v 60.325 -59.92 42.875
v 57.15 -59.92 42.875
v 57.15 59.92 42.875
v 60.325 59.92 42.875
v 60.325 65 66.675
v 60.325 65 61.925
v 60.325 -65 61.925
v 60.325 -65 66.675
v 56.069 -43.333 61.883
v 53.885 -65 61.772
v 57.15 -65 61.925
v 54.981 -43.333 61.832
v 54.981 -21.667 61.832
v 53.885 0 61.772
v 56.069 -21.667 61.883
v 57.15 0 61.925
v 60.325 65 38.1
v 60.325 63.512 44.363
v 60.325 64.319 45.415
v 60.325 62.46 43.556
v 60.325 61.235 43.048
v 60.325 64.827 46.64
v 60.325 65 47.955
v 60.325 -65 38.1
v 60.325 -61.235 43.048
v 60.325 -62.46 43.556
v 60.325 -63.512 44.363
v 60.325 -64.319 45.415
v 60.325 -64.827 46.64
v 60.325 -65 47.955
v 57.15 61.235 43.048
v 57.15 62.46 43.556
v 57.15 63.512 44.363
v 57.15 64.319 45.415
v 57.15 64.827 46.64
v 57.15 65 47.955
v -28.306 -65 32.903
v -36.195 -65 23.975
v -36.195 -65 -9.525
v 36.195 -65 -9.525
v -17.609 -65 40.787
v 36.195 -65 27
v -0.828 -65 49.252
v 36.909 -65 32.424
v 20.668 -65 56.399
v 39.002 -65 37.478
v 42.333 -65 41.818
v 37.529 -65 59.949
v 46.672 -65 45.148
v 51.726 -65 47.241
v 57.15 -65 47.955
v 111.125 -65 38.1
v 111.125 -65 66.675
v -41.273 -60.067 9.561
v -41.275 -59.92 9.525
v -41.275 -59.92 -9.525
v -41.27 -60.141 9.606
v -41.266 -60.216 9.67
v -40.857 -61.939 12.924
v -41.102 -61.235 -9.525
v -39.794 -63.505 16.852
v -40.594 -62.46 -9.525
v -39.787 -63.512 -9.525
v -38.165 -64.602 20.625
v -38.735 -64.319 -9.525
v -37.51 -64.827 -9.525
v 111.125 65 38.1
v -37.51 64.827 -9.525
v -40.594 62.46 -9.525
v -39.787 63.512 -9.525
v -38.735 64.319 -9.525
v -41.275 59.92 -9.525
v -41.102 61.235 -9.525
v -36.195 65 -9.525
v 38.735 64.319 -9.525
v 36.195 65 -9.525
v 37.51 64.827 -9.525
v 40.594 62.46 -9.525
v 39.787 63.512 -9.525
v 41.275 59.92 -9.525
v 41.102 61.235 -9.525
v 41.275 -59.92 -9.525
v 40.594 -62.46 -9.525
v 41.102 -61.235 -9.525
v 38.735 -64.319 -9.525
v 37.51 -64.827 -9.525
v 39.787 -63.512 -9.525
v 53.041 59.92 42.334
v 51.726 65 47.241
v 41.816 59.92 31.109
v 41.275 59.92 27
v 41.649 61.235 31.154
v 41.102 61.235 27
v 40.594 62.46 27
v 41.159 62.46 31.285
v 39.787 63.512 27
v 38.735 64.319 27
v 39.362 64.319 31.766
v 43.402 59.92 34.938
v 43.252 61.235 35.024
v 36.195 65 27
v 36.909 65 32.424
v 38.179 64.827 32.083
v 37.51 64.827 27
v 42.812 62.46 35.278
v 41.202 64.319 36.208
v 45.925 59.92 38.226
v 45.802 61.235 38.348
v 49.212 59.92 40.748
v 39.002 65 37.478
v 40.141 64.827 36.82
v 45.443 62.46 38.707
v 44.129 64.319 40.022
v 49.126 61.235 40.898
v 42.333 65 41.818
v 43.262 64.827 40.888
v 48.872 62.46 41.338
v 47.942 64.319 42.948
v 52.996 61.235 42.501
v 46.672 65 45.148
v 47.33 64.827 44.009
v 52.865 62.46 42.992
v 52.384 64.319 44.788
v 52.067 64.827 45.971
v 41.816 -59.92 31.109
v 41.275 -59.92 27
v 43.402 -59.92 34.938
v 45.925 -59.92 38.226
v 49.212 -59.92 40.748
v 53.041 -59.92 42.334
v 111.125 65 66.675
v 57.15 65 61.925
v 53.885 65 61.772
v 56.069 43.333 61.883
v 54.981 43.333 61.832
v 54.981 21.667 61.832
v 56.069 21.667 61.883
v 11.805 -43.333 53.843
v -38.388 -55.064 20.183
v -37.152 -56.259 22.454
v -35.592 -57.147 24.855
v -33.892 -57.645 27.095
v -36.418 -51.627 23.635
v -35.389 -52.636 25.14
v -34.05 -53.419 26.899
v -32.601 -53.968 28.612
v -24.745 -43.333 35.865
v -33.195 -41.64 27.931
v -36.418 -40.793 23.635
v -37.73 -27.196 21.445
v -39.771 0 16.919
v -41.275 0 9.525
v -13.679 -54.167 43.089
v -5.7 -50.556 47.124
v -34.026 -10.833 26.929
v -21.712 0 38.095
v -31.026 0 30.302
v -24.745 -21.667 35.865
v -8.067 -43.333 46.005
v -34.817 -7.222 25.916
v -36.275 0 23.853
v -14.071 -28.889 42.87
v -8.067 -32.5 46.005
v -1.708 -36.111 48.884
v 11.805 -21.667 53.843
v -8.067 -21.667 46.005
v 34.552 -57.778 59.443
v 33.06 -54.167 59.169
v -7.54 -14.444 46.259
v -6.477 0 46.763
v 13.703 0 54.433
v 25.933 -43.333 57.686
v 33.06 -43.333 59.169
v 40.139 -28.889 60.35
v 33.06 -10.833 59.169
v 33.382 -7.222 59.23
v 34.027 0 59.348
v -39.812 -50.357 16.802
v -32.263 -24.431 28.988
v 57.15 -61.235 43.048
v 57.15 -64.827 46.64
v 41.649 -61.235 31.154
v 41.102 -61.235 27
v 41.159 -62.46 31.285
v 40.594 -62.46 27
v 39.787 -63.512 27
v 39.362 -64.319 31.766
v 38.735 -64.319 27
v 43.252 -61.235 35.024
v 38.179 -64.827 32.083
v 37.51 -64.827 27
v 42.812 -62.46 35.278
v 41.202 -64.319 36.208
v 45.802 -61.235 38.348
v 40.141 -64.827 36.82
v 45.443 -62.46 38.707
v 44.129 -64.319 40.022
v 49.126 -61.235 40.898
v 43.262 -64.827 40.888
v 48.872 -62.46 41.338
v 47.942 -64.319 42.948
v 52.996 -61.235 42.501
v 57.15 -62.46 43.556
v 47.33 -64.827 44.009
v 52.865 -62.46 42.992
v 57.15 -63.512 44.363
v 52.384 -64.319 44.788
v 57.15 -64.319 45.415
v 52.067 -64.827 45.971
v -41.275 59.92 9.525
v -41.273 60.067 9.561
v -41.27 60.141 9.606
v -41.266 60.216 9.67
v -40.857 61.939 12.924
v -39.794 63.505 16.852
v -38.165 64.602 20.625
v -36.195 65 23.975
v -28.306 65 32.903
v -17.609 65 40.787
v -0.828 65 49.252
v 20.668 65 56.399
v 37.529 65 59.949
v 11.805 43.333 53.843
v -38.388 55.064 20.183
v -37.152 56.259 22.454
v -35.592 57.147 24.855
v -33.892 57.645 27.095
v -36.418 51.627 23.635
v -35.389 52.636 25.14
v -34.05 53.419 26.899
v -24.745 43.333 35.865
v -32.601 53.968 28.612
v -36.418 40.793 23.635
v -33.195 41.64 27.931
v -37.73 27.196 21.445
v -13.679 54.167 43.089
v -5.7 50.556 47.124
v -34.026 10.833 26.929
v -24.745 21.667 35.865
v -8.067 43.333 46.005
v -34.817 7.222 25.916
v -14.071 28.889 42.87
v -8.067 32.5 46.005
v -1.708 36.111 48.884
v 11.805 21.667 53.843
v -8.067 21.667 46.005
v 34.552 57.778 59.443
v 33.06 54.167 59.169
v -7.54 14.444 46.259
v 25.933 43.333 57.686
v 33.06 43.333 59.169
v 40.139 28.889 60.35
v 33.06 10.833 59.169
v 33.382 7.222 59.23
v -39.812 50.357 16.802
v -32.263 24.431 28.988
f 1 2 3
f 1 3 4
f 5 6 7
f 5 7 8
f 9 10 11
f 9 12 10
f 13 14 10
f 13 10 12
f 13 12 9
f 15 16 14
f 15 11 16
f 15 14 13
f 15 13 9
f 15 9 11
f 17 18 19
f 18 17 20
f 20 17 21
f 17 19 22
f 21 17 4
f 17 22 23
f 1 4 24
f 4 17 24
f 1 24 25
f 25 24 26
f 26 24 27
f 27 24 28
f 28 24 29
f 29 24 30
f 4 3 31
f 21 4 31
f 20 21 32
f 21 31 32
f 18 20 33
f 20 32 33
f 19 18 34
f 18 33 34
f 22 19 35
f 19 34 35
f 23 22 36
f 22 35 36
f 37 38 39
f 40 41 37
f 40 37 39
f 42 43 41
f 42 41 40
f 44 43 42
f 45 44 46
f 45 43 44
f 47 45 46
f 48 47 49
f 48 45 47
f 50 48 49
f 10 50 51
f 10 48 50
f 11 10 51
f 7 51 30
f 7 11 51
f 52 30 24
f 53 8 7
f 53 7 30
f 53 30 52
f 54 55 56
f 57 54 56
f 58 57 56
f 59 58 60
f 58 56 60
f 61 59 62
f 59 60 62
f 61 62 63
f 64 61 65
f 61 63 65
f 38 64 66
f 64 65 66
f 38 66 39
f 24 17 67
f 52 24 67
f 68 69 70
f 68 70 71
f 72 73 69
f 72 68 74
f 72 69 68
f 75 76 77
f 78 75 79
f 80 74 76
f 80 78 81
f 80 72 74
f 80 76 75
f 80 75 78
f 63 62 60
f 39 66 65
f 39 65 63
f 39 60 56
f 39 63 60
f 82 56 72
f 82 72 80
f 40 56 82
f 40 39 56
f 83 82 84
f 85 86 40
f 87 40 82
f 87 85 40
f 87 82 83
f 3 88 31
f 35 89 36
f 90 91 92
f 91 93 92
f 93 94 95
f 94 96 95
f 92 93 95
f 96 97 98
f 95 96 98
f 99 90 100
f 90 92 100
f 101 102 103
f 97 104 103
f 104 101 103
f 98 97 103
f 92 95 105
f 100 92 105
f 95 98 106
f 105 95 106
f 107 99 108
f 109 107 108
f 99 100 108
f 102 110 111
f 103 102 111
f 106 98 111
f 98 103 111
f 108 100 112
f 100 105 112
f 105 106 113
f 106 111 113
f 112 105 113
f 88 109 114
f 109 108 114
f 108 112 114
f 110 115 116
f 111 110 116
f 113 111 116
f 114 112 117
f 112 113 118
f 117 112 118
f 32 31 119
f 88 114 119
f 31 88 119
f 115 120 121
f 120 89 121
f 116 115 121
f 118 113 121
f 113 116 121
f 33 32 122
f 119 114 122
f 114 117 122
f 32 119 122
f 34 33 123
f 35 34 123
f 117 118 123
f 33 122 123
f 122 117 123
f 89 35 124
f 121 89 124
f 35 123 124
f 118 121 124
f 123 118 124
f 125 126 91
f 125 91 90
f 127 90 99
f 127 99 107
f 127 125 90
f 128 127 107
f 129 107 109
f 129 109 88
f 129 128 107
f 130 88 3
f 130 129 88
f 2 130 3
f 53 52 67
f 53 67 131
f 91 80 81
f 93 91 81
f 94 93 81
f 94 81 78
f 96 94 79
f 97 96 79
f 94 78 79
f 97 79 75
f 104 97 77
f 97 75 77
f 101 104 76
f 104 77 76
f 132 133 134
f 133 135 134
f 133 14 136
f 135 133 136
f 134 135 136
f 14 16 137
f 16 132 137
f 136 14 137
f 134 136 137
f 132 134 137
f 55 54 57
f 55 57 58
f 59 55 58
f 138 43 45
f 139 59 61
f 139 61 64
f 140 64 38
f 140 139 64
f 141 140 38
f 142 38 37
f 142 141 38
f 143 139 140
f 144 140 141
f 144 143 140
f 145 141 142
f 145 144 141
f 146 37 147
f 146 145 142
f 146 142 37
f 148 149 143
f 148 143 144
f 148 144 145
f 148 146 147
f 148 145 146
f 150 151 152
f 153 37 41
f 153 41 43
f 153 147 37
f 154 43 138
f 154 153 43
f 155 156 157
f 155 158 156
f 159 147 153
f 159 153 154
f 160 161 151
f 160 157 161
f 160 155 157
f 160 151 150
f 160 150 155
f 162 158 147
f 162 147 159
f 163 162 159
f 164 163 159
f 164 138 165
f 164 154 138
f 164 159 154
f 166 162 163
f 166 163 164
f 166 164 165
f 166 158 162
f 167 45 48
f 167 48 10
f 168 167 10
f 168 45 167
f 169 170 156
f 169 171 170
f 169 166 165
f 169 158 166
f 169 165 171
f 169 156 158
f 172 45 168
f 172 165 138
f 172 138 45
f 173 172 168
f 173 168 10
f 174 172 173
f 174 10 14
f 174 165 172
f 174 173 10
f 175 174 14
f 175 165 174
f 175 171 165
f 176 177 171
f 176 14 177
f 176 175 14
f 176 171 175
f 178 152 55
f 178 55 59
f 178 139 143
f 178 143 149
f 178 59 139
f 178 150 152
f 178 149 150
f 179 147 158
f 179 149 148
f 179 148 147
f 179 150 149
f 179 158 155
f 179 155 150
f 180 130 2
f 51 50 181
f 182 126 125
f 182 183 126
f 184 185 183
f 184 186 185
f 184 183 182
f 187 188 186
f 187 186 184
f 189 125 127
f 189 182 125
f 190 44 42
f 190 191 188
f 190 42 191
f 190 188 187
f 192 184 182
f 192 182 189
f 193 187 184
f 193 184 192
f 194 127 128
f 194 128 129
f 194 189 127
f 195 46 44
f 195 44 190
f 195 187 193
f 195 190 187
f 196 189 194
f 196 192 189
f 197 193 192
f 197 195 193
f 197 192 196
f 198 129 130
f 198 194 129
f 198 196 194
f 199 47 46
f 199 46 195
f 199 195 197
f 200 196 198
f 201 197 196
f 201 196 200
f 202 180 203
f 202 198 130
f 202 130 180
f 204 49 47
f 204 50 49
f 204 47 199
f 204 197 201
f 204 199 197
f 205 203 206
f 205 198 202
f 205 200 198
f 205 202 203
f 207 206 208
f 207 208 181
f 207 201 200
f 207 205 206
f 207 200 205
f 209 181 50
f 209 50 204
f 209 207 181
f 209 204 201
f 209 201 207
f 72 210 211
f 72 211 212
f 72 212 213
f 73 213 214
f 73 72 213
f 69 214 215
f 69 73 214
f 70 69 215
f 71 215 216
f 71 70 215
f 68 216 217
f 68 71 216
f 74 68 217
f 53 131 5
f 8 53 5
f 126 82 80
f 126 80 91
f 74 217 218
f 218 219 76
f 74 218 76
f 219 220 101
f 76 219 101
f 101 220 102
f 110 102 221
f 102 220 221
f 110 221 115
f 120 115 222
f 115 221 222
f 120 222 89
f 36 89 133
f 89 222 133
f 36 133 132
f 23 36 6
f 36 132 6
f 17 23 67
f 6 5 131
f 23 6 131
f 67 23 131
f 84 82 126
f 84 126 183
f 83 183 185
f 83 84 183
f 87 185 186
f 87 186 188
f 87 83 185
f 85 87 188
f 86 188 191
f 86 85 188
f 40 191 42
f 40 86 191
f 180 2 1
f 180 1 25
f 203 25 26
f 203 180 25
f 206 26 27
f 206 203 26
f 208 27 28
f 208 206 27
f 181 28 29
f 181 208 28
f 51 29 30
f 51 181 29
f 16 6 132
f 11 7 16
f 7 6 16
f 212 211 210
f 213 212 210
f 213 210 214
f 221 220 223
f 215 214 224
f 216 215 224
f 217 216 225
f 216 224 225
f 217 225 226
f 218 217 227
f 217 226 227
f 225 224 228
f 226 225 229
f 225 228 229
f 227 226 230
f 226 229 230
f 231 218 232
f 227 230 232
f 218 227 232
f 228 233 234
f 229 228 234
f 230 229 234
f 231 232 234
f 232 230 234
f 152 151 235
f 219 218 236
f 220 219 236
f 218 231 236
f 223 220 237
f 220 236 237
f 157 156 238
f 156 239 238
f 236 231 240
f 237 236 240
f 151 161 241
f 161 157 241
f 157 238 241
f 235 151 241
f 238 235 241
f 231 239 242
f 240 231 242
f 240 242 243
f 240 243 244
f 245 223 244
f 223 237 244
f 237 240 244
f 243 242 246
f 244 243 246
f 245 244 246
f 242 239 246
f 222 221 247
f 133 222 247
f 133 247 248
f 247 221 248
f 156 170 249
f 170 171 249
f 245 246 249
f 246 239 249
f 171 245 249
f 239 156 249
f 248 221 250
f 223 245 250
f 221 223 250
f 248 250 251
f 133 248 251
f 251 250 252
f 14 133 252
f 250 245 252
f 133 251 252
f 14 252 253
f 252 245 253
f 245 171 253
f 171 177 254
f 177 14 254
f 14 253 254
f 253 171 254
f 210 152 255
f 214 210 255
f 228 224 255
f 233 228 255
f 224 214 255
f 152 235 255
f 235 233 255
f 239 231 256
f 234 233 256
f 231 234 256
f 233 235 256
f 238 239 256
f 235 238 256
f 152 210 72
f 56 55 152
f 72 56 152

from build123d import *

# Parameters (mm, degrees)
F0_W         = 25.4
F0_H         = 19.05
F0_H_2       = 4.7498
F0_H_3       = 4.7752
F1_DEPTH     = 65
F2_DEPTH     = 25.4
F3_DEPTH     = 7.9375
F5_T1_DEPTH  = 49.2252
F5_T3_DEPTH  = 53.34
F5_T5_DEPTH  = 3.175
F5_T8_ANGLE  = 90
F5_T10_ANGLE = 90


# Not quite as in the source:
# - a fillet or chamfer that OpenCascade refuses, or shapes differently, is made with other operations: its cross-section is extruded or revolved along the edge and cut away or added


with BuildPart() as f1:
    # F0 (on Front) → F1 (new body, symmetric)
    with BuildSketch(Plane.XZ):
        Polygon((22.225, 9.525), (-41.275, 9.525), (-41.275, -9.525), (41.275, -9.525), (41.275, 9.525), align=None)
        with BuildLine():
            add(Edge.make_bspline(
                [(-41.275, 9.525), (-39.5856284224, 39.4828766469), (13.870125209, 59.4306981306), (53.8854342407, 61.7722898912)],
                knots=[0, 0, 0, 0, 108.5245810491, 108.5245810491, 108.5245810491, 108.5245810491], degree=3))
            Line((-41.275, 9.525), (22.225, 9.525))
            Line((22.225, 9.525), (22.225, 27.0002))
            ThreePointArc((22.225, 27.0002), (31.3258777096, 50.5133948686), (53.8854342407, 61.7722898912))
        make_face()
        with BuildLine():
            Line((22.225, 27.0002), (22.225, 9.525))
            Line((22.225, 9.525), (41.275, 9.525))
            Line((41.275, 9.525), (41.275, 27.0002))
            ThreePointArc((41.275, 27.0002), (45.9246798487, 38.2255201513), (57.15, 42.8752))
            Line((57.15, 42.8752), (60.325, 42.8752))
            Line((60.325, 42.8752), (60.325, 61.9252))
            Line((60.325, 61.9252), (57.15, 61.9252))
            add(Edge.make_bspline(
                [(53.8854342407, 61.7722898912), (54.9842067368, 61.8365871986), (56.0728453275, 61.8876096574), (57.15, 61.9252)],
                knots=[108.5245810491, 108.5245810491, 108.5245810491, 108.5245810491, 111.5045361635, 111.5045361635, 111.5045361635, 111.5045361635], degree=3))
            ThreePointArc((53.8854342407, 61.7722898912), (31.3258777096, 50.5133948686), (22.225, 27.0002))
        make_face()
        with Locations((73.025, 52.4002)):
            Rectangle(F0_W, F0_H)
        with Locations((73.025, 64.3001)):
            Rectangle(F0_W, F0_H_2)
        with Locations((73.025, 40.4876)):
            Rectangle(F0_W, F0_H_3)
        Polygon((85.725, 66.675), (85.725, 61.9252), (85.725, 42.8752), (85.725, 38.1), (111.125, 38.1), (111.125, 66.675), align=None)
    extrude(amount=F1_DEPTH, both=True)

    # F0 (on Front) → F2 (join, symmetric)
    with BuildSketch(Plane.XZ):
        with BuildLine():
            Line((22.225, 27.0002), (22.225, 9.525))
            Line((22.225, 9.525), (41.275, 9.525))
            Line((41.275, 9.525), (41.275, 27.0002))
            ThreePointArc((41.275, 27.0002), (45.9246798487, 38.2255201513), (57.15, 42.8752))
            Line((57.15, 42.8752), (60.325, 42.8752))
            Line((60.325, 42.8752), (60.325, 61.9252))
            Line((60.325, 61.9252), (57.15, 61.9252))
            add(Edge.make_bspline(
                [(53.8854342407, 61.7722898912), (54.9842067368, 61.8365871986), (56.0728453275, 61.8876096574), (57.15, 61.9252)],
                knots=[108.5245810491, 108.5245810491, 108.5245810491, 108.5245810491, 111.5045361635, 111.5045361635, 111.5045361635, 111.5045361635], degree=3))
            ThreePointArc((53.8854342407, 61.7722898912), (31.3258777096, 50.5133948686), (22.225, 27.0002))
        make_face()
        with Locations((73.025, 52.4002)):
            Rectangle(F0_W, F0_H)
    extrude(amount=F2_DEPTH, both=True)

    # F0 (on Front) → F3 (join, symmetric)
    with BuildSketch(Plane.XZ):
        with BuildLine():
            add(Edge.make_bspline(
                [(-41.275, 9.525), (-39.5856284224, 39.4828766469), (13.870125209, 59.4306981306), (53.8854342407, 61.7722898912)],
                knots=[0, 0, 0, 0, 108.5245810491, 108.5245810491, 108.5245810491, 108.5245810491], degree=3))
            Line((-41.275, 9.525), (22.225, 9.525))
            Line((22.225, 9.525), (22.225, 27.0002))
            ThreePointArc((22.225, 27.0002), (31.3258777096, 50.5133948686), (53.8854342407, 61.7722898912))
        make_face()
    extrude(amount=F3_DEPTH, both=True)

    # F0 (on Front) → F4 (revolve)
    with BuildSketch(Plane.XZ):
        Polygon((85.725, 66.675), (85.725, 61.9252), (85.725, 42.8752), (85.725, 38.1), (111.125, 38.1), (111.125, 66.675), align=None)
    revolve(axis=Axis((85.725, 0, 52.3875), (0, 0, 1)))

    # F5: fillet of radius 5.08 on 8 edges, made by hand

    # F5_s2 → F5_t1 (cut)
    with BuildSketch(Plane.XY.offset(-22.225)):
        with BuildLine():
            ThreePointArc((41.275, -59.92), (39.7871024484, -63.5121024484), (36.195, -65))
            Line((36.195, -65), (41.275, -65))
            Line((41.275, -65), (41.275, -59.92))
        make_face()
        with BuildLine():
            ThreePointArc((41.275, 59.92), (39.7871024484, 63.5121024484), (36.195, 65))
            Line((36.195, 65), (41.275, 65))
            Line((41.275, 65), (41.275, 59.92))
        make_face()
    extrude(amount=F5_T1_DEPTH, mode=Mode.SUBTRACT)

    # F5_s4 → F5_t3 (cut)
    with BuildSketch(Plane.XY.offset(-22.225)):
        with BuildLine():
            ThreePointArc((-41.275, -59.92), (-39.7871024484, -63.5121024484), (-36.195, -65))
            Line((-36.195, -65), (-41.275, -65))
            Line((-41.275, -65), (-41.275, -59.92))
        make_face()
        with BuildLine():
            ThreePointArc((-41.275, 59.92), (-39.7871024484, 63.5121024484), (-36.195, 65))
            Line((-36.195, 65), (-41.275, 65))
            Line((-41.275, 65), (-41.275, 59.92))
        make_face()
    extrude(amount=F5_T3_DEPTH, mode=Mode.SUBTRACT)

    # F5_s6 → F5_t5 (cut)
    with BuildSketch(Plane.YZ.offset(57.15)):
        with BuildLine():
            ThreePointArc((59.92, 42.8752), (63.5121024484, 44.3630975516), (65, 47.9552))
            Line((65, 47.9552), (65, 42.8752))
            Line((65, 42.8752), (59.92, 42.8752))
        make_face()
        with BuildLine():
            ThreePointArc((-59.92, 42.8752), (-63.5121024484, 44.3630975516), (-65, 47.9552))
            Line((-65, 47.9552), (-65, 42.8752))
            Line((-65, 42.8752), (-59.92, 42.8752))
        make_face()
    extrude(amount=F5_T5_DEPTH, mode=Mode.SUBTRACT)

    # F5_s7 → F5_t8 (revolve, cut)
    with BuildSketch(Plane.XY.offset(27.0002)):
        with BuildLine():
            ThreePointArc((41.275, 59.92), (39.7871024484, 63.5121024484), (36.195, 65))
            Line((36.195, 65), (41.275, 65))
            Line((41.275, 65), (41.275, 59.92))
        make_face()
    revolve(axis=Axis((57.15, 65, 27.0002), (0, 1, 0)), revolution_arc=F5_T8_ANGLE, mode=Mode.SUBTRACT)

    # F5_s9 → F5_t10 (revolve, cut)
    with BuildSketch(Plane.XY.offset(27.0002)):
        with BuildLine():
            ThreePointArc((41.275, -59.92), (39.7871024484, -63.5121024484), (36.195, -65))
            Line((36.195, -65), (41.275, -65))
            Line((41.275, -65), (41.275, -59.92))
        make_face()
    revolve(axis=Axis((57.15, -65, 27.0002), (0, 1, 0)), revolution_arc=F5_T10_ANGLE, mode=Mode.SUBTRACT)


solid = f1.part
